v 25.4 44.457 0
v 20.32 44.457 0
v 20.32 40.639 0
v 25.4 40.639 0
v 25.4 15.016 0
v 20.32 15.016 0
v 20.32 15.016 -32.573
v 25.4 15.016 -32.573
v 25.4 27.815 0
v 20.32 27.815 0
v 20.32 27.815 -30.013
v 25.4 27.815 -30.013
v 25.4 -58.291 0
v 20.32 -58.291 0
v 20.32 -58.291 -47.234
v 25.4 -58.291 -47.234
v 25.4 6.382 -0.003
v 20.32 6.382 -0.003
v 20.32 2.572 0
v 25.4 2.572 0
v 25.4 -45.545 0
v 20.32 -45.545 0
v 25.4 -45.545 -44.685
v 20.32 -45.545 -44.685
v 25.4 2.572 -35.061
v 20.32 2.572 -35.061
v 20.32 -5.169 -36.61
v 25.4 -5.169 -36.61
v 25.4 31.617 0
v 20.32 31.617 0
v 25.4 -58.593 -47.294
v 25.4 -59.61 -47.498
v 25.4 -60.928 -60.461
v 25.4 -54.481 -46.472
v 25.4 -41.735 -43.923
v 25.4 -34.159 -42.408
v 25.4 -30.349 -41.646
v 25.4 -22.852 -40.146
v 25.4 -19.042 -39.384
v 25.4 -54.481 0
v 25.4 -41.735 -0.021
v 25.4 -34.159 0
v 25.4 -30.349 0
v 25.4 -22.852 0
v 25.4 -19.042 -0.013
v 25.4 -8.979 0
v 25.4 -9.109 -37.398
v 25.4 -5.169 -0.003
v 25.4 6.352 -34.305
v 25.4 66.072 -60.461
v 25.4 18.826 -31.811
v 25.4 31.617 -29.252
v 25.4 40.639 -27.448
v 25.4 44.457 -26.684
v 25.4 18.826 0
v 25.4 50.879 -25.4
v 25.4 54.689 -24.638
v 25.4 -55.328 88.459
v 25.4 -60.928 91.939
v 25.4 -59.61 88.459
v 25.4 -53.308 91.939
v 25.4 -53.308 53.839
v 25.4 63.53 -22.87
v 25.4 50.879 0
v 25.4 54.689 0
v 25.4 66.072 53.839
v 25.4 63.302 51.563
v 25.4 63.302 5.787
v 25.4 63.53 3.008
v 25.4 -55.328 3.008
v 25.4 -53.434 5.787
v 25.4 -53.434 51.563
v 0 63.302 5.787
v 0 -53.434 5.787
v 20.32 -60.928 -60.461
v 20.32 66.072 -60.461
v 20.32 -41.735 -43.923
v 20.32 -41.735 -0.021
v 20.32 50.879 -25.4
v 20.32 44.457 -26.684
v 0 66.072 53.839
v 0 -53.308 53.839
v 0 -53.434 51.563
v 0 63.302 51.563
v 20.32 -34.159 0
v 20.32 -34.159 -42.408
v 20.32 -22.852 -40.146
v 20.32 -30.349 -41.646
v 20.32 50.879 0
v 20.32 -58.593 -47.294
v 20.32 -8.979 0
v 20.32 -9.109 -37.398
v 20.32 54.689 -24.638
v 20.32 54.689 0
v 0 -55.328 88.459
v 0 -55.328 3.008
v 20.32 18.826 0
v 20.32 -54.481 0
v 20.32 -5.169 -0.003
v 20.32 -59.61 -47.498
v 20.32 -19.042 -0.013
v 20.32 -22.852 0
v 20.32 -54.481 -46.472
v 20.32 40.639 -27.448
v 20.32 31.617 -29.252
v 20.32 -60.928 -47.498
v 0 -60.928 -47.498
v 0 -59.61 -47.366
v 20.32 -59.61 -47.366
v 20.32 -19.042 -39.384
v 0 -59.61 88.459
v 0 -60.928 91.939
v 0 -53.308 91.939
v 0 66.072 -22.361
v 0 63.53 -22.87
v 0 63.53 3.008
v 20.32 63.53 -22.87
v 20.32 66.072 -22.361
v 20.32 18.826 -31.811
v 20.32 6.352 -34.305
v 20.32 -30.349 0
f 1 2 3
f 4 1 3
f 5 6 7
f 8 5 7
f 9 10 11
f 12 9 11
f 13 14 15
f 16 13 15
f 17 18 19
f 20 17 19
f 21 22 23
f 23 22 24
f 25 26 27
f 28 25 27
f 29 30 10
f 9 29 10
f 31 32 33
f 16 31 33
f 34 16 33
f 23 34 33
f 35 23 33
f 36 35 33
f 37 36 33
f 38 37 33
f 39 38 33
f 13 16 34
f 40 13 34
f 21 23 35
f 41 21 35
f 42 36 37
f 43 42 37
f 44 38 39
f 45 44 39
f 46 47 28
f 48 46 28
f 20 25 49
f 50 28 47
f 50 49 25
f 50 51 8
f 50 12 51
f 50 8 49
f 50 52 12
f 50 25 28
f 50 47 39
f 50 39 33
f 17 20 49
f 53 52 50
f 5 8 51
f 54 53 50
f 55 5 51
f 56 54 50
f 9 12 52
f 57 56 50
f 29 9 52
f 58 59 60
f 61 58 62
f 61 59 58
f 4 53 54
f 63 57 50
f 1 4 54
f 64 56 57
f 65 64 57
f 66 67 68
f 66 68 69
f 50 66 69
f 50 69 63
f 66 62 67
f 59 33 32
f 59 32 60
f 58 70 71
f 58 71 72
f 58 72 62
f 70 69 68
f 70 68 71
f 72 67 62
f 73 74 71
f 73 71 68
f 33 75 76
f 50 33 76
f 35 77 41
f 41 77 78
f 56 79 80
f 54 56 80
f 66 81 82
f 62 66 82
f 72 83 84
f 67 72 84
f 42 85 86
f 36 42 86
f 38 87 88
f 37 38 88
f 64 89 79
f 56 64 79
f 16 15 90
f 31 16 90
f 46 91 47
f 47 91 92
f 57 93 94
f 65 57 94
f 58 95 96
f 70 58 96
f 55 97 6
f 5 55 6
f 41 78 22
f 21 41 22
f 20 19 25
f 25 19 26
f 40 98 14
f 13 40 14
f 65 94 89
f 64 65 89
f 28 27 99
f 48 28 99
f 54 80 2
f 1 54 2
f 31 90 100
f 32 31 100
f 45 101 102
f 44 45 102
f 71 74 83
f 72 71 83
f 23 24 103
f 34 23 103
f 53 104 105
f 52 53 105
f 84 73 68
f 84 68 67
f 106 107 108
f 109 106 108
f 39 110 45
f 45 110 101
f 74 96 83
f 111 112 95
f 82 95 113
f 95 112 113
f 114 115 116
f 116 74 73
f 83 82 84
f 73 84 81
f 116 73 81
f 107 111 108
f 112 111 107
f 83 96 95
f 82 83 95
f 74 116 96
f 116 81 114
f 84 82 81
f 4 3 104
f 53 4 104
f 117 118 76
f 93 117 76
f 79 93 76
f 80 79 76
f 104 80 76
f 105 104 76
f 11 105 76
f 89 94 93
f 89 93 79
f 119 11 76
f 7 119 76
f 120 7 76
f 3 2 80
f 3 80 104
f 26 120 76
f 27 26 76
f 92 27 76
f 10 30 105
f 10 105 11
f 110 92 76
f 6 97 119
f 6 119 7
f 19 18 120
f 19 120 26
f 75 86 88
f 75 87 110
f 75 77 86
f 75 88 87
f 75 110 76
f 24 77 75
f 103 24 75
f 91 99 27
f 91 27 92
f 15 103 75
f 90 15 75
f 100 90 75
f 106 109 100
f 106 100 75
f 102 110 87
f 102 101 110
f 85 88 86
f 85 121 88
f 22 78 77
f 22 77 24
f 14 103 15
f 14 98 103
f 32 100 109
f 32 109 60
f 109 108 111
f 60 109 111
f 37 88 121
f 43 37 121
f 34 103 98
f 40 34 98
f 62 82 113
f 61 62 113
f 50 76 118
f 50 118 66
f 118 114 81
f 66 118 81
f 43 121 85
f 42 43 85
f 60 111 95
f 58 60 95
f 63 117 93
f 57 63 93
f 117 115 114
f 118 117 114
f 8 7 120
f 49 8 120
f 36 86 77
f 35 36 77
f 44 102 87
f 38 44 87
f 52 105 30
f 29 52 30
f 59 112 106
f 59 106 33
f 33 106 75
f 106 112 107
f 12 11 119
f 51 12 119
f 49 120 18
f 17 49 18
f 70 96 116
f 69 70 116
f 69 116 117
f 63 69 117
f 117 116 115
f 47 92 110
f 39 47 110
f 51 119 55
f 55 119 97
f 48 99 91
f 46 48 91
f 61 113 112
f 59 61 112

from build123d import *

# Parameters (mm, degrees)
F0_W     = 116.736240685
F0_H     = 45.7762465812
F1_DEPTH = 25.4
F3_DEPTH = 20.32


with BuildPart() as f1:
    # F0 (on Right) → F1 (new body)
    with BuildSketch(Plane.YZ):
        Polygon((-60.9279610217, -47.761421484), (-60.9279610217, -60.461421484), (66.0720389783, -60.461421484), (66.0720389783, -45.2970974147), (66.0720389783, -42.7577458322), (66.0720389783, -40.2231365442), (66.0720389783, -37.6602597535), (66.0720389783, -35.1163968444), (66.0720389783, -32.5725339353), (66.0720389783, -30.0129074603), (66.0720389783, -27.4480152875), (66.0720389783, -25.4), (66.0720389783, -22.361421484), (63.5299555494, -22.8698381698), (63.5299555494, -56.7358210683), (-58.5926286876, -56.7358210683), (-58.5926286876, -47.2943550172), (-59.6095568016, -47.49774064), align=None)
        Polygon((-60.9279610217, 3.0077947435), (-60.9279610217, -47.761421484), (-59.6095568016, -47.49774064), (-59.6095568016, -16.7404655367), (-59.6095568016, 3.0077947435), align=None)
        Polygon((-60.9279610217, 53.8077947435), (-60.9279610217, 3.0077947435), (-59.6095568016, 3.0077947435), (-59.6095568016, 88.458865881), (-55.3284734488, 88.458865881), (-55.3284734488, 54.3211102486), (-55.3284734488, 3.0077947435), (63.5299555494, 3.0077947435), (66.0720389783, 3.0077947435), (66.0720389783, 53.838578516), (-53.3079610217, 53.838578516), (-53.3079610217, 91.938578516), (-60.9279610217, 91.938578516), align=None)
        with Locations((4.933912307, 28.6751843523)):
            Rectangle(F0_W, F0_H, mode=Mode.SUBTRACT)
        Polygon((66.0720389783, 3.0077947435), (63.5299555494, 3.0077947435), (63.5299555494, -22.8698381698), (66.0720389783, -22.361421484), align=None)
        Polygon((-58.2911525815, -47.234059796), (-58.5926286876, -47.2943550172), (-58.5926286876, -56.7358210683), (63.5299555494, -56.7358210683), (63.5299555494, -22.8698381698), (54.6891463984, -24.638), (54.6891463984, 0), (50.8791463984, 0), (50.8791463984, -25.4), (44.4574505091, -26.6843391779), (44.4574505091, 0), (40.6390699608, 0), (40.6390699608, -27.4480152875), (31.6170305014, -29.2524231794), (31.6170305014, 0), (27.8146090967, 0), (27.8146090967, -30.0129074603), (18.8264767218, -31.8105339353), (18.8264767218, 0), (15.0164767218, 0), (15.0164767218, -32.5725339353), (6.3523404126, -34.3053611972), (6.3820375505, -0.0032985204), (2.5720389783, 0), (2.5720389783, -35.061421484), (-5.1686692631, -36.6095631323), (-5.1686692631, -0.0032985204), (-8.9786678353, 0), (-9.1092809997, -37.3976854796), (-19.0416296813, -39.3841552159), (-19.0416296813, -0.0133065219), (-22.8516064445, 0), (-22.8516064445, -40.1461505686), (-30.3492701047, -41.6456833006), (-30.3492701047, 0), (-34.1592701047, 0), (-34.1592701047, -42.4076833006), (-41.7353913358, -43.9229075468), (-41.7353913358, -0.0208968543), (-45.5453340285, 0), (-45.5453340285, -44.6848960854), (-54.4811525815, -46.472059796), (-54.4811525815, 0), (-58.2911525815, 0), align=None)
    extrude(amount=F1_DEPTH)

    # F2 (on face) → F3 (cut)
    with BuildSketch(Plane(origin=(0, 0, 0), x_dir=(0, -1, 0), z_dir=(-1, 0, 0))):
        Polygon((-66.0720389783, -22.361421484), (-66.0720389783, -22.8698381698), (-66.0720389783, -60.461421484), (60.9279610217, -60.461421484), (60.9279610217, -47.49774064), (59.6095568016, -47.365900218), (59.6095568016, -47.49774064), (58.2911525815, -47.234059796), (58.2911525815, 0), (54.4811525815, 0), (54.4811525815, -46.472059796), (45.5453340285, -44.6848960854), (45.5453340285, 0), (41.7353913358, -0.0208968543), (41.7353913358, -43.9229075468), (34.1592701047, -42.4076833006), (34.1592701047, 0), (30.3492701047, 0), (30.3492701047, -41.6456833006), (22.8516064445, -40.1461505686), (22.8516064445, 0), (19.0416296813, -0.0133065219), (19.0416296813, -39.3841552159), (9.1092809997, -37.3976854796), (8.9786678353, 0), (5.1686692631, -0.0032985204), (5.1686692631, -36.6095631323), (-2.5720389783, -35.061421484), (-2.5720389783, 0), (-6.3820375505, -0.0032985204), (-6.3523404126, -34.3053611972), (-15.0164767218, -32.5725339353), (-15.0164767218, 0), (-18.8264767218, 0), (-18.8264767218, -31.8105339353), (-27.8146090967, -30.0129074603), (-27.8146090967, 0), (-31.6170305014, 0), (-31.6170305014, -29.2524231794), (-40.6390699608, -27.4480152875), (-40.6390699608, 0), (-44.4574505091, 0), (-44.4574505091, -26.6843391779), (-50.8791463984, -25.4), (-50.8791463984, 0), (-54.6891463984, 0), (-54.6891463984, -24.638), (-63.5299555494, -22.8698381698), align=None)
    extrude(amount=-F3_DEPTH, mode=Mode.SUBTRACT)


solid = f1.part
